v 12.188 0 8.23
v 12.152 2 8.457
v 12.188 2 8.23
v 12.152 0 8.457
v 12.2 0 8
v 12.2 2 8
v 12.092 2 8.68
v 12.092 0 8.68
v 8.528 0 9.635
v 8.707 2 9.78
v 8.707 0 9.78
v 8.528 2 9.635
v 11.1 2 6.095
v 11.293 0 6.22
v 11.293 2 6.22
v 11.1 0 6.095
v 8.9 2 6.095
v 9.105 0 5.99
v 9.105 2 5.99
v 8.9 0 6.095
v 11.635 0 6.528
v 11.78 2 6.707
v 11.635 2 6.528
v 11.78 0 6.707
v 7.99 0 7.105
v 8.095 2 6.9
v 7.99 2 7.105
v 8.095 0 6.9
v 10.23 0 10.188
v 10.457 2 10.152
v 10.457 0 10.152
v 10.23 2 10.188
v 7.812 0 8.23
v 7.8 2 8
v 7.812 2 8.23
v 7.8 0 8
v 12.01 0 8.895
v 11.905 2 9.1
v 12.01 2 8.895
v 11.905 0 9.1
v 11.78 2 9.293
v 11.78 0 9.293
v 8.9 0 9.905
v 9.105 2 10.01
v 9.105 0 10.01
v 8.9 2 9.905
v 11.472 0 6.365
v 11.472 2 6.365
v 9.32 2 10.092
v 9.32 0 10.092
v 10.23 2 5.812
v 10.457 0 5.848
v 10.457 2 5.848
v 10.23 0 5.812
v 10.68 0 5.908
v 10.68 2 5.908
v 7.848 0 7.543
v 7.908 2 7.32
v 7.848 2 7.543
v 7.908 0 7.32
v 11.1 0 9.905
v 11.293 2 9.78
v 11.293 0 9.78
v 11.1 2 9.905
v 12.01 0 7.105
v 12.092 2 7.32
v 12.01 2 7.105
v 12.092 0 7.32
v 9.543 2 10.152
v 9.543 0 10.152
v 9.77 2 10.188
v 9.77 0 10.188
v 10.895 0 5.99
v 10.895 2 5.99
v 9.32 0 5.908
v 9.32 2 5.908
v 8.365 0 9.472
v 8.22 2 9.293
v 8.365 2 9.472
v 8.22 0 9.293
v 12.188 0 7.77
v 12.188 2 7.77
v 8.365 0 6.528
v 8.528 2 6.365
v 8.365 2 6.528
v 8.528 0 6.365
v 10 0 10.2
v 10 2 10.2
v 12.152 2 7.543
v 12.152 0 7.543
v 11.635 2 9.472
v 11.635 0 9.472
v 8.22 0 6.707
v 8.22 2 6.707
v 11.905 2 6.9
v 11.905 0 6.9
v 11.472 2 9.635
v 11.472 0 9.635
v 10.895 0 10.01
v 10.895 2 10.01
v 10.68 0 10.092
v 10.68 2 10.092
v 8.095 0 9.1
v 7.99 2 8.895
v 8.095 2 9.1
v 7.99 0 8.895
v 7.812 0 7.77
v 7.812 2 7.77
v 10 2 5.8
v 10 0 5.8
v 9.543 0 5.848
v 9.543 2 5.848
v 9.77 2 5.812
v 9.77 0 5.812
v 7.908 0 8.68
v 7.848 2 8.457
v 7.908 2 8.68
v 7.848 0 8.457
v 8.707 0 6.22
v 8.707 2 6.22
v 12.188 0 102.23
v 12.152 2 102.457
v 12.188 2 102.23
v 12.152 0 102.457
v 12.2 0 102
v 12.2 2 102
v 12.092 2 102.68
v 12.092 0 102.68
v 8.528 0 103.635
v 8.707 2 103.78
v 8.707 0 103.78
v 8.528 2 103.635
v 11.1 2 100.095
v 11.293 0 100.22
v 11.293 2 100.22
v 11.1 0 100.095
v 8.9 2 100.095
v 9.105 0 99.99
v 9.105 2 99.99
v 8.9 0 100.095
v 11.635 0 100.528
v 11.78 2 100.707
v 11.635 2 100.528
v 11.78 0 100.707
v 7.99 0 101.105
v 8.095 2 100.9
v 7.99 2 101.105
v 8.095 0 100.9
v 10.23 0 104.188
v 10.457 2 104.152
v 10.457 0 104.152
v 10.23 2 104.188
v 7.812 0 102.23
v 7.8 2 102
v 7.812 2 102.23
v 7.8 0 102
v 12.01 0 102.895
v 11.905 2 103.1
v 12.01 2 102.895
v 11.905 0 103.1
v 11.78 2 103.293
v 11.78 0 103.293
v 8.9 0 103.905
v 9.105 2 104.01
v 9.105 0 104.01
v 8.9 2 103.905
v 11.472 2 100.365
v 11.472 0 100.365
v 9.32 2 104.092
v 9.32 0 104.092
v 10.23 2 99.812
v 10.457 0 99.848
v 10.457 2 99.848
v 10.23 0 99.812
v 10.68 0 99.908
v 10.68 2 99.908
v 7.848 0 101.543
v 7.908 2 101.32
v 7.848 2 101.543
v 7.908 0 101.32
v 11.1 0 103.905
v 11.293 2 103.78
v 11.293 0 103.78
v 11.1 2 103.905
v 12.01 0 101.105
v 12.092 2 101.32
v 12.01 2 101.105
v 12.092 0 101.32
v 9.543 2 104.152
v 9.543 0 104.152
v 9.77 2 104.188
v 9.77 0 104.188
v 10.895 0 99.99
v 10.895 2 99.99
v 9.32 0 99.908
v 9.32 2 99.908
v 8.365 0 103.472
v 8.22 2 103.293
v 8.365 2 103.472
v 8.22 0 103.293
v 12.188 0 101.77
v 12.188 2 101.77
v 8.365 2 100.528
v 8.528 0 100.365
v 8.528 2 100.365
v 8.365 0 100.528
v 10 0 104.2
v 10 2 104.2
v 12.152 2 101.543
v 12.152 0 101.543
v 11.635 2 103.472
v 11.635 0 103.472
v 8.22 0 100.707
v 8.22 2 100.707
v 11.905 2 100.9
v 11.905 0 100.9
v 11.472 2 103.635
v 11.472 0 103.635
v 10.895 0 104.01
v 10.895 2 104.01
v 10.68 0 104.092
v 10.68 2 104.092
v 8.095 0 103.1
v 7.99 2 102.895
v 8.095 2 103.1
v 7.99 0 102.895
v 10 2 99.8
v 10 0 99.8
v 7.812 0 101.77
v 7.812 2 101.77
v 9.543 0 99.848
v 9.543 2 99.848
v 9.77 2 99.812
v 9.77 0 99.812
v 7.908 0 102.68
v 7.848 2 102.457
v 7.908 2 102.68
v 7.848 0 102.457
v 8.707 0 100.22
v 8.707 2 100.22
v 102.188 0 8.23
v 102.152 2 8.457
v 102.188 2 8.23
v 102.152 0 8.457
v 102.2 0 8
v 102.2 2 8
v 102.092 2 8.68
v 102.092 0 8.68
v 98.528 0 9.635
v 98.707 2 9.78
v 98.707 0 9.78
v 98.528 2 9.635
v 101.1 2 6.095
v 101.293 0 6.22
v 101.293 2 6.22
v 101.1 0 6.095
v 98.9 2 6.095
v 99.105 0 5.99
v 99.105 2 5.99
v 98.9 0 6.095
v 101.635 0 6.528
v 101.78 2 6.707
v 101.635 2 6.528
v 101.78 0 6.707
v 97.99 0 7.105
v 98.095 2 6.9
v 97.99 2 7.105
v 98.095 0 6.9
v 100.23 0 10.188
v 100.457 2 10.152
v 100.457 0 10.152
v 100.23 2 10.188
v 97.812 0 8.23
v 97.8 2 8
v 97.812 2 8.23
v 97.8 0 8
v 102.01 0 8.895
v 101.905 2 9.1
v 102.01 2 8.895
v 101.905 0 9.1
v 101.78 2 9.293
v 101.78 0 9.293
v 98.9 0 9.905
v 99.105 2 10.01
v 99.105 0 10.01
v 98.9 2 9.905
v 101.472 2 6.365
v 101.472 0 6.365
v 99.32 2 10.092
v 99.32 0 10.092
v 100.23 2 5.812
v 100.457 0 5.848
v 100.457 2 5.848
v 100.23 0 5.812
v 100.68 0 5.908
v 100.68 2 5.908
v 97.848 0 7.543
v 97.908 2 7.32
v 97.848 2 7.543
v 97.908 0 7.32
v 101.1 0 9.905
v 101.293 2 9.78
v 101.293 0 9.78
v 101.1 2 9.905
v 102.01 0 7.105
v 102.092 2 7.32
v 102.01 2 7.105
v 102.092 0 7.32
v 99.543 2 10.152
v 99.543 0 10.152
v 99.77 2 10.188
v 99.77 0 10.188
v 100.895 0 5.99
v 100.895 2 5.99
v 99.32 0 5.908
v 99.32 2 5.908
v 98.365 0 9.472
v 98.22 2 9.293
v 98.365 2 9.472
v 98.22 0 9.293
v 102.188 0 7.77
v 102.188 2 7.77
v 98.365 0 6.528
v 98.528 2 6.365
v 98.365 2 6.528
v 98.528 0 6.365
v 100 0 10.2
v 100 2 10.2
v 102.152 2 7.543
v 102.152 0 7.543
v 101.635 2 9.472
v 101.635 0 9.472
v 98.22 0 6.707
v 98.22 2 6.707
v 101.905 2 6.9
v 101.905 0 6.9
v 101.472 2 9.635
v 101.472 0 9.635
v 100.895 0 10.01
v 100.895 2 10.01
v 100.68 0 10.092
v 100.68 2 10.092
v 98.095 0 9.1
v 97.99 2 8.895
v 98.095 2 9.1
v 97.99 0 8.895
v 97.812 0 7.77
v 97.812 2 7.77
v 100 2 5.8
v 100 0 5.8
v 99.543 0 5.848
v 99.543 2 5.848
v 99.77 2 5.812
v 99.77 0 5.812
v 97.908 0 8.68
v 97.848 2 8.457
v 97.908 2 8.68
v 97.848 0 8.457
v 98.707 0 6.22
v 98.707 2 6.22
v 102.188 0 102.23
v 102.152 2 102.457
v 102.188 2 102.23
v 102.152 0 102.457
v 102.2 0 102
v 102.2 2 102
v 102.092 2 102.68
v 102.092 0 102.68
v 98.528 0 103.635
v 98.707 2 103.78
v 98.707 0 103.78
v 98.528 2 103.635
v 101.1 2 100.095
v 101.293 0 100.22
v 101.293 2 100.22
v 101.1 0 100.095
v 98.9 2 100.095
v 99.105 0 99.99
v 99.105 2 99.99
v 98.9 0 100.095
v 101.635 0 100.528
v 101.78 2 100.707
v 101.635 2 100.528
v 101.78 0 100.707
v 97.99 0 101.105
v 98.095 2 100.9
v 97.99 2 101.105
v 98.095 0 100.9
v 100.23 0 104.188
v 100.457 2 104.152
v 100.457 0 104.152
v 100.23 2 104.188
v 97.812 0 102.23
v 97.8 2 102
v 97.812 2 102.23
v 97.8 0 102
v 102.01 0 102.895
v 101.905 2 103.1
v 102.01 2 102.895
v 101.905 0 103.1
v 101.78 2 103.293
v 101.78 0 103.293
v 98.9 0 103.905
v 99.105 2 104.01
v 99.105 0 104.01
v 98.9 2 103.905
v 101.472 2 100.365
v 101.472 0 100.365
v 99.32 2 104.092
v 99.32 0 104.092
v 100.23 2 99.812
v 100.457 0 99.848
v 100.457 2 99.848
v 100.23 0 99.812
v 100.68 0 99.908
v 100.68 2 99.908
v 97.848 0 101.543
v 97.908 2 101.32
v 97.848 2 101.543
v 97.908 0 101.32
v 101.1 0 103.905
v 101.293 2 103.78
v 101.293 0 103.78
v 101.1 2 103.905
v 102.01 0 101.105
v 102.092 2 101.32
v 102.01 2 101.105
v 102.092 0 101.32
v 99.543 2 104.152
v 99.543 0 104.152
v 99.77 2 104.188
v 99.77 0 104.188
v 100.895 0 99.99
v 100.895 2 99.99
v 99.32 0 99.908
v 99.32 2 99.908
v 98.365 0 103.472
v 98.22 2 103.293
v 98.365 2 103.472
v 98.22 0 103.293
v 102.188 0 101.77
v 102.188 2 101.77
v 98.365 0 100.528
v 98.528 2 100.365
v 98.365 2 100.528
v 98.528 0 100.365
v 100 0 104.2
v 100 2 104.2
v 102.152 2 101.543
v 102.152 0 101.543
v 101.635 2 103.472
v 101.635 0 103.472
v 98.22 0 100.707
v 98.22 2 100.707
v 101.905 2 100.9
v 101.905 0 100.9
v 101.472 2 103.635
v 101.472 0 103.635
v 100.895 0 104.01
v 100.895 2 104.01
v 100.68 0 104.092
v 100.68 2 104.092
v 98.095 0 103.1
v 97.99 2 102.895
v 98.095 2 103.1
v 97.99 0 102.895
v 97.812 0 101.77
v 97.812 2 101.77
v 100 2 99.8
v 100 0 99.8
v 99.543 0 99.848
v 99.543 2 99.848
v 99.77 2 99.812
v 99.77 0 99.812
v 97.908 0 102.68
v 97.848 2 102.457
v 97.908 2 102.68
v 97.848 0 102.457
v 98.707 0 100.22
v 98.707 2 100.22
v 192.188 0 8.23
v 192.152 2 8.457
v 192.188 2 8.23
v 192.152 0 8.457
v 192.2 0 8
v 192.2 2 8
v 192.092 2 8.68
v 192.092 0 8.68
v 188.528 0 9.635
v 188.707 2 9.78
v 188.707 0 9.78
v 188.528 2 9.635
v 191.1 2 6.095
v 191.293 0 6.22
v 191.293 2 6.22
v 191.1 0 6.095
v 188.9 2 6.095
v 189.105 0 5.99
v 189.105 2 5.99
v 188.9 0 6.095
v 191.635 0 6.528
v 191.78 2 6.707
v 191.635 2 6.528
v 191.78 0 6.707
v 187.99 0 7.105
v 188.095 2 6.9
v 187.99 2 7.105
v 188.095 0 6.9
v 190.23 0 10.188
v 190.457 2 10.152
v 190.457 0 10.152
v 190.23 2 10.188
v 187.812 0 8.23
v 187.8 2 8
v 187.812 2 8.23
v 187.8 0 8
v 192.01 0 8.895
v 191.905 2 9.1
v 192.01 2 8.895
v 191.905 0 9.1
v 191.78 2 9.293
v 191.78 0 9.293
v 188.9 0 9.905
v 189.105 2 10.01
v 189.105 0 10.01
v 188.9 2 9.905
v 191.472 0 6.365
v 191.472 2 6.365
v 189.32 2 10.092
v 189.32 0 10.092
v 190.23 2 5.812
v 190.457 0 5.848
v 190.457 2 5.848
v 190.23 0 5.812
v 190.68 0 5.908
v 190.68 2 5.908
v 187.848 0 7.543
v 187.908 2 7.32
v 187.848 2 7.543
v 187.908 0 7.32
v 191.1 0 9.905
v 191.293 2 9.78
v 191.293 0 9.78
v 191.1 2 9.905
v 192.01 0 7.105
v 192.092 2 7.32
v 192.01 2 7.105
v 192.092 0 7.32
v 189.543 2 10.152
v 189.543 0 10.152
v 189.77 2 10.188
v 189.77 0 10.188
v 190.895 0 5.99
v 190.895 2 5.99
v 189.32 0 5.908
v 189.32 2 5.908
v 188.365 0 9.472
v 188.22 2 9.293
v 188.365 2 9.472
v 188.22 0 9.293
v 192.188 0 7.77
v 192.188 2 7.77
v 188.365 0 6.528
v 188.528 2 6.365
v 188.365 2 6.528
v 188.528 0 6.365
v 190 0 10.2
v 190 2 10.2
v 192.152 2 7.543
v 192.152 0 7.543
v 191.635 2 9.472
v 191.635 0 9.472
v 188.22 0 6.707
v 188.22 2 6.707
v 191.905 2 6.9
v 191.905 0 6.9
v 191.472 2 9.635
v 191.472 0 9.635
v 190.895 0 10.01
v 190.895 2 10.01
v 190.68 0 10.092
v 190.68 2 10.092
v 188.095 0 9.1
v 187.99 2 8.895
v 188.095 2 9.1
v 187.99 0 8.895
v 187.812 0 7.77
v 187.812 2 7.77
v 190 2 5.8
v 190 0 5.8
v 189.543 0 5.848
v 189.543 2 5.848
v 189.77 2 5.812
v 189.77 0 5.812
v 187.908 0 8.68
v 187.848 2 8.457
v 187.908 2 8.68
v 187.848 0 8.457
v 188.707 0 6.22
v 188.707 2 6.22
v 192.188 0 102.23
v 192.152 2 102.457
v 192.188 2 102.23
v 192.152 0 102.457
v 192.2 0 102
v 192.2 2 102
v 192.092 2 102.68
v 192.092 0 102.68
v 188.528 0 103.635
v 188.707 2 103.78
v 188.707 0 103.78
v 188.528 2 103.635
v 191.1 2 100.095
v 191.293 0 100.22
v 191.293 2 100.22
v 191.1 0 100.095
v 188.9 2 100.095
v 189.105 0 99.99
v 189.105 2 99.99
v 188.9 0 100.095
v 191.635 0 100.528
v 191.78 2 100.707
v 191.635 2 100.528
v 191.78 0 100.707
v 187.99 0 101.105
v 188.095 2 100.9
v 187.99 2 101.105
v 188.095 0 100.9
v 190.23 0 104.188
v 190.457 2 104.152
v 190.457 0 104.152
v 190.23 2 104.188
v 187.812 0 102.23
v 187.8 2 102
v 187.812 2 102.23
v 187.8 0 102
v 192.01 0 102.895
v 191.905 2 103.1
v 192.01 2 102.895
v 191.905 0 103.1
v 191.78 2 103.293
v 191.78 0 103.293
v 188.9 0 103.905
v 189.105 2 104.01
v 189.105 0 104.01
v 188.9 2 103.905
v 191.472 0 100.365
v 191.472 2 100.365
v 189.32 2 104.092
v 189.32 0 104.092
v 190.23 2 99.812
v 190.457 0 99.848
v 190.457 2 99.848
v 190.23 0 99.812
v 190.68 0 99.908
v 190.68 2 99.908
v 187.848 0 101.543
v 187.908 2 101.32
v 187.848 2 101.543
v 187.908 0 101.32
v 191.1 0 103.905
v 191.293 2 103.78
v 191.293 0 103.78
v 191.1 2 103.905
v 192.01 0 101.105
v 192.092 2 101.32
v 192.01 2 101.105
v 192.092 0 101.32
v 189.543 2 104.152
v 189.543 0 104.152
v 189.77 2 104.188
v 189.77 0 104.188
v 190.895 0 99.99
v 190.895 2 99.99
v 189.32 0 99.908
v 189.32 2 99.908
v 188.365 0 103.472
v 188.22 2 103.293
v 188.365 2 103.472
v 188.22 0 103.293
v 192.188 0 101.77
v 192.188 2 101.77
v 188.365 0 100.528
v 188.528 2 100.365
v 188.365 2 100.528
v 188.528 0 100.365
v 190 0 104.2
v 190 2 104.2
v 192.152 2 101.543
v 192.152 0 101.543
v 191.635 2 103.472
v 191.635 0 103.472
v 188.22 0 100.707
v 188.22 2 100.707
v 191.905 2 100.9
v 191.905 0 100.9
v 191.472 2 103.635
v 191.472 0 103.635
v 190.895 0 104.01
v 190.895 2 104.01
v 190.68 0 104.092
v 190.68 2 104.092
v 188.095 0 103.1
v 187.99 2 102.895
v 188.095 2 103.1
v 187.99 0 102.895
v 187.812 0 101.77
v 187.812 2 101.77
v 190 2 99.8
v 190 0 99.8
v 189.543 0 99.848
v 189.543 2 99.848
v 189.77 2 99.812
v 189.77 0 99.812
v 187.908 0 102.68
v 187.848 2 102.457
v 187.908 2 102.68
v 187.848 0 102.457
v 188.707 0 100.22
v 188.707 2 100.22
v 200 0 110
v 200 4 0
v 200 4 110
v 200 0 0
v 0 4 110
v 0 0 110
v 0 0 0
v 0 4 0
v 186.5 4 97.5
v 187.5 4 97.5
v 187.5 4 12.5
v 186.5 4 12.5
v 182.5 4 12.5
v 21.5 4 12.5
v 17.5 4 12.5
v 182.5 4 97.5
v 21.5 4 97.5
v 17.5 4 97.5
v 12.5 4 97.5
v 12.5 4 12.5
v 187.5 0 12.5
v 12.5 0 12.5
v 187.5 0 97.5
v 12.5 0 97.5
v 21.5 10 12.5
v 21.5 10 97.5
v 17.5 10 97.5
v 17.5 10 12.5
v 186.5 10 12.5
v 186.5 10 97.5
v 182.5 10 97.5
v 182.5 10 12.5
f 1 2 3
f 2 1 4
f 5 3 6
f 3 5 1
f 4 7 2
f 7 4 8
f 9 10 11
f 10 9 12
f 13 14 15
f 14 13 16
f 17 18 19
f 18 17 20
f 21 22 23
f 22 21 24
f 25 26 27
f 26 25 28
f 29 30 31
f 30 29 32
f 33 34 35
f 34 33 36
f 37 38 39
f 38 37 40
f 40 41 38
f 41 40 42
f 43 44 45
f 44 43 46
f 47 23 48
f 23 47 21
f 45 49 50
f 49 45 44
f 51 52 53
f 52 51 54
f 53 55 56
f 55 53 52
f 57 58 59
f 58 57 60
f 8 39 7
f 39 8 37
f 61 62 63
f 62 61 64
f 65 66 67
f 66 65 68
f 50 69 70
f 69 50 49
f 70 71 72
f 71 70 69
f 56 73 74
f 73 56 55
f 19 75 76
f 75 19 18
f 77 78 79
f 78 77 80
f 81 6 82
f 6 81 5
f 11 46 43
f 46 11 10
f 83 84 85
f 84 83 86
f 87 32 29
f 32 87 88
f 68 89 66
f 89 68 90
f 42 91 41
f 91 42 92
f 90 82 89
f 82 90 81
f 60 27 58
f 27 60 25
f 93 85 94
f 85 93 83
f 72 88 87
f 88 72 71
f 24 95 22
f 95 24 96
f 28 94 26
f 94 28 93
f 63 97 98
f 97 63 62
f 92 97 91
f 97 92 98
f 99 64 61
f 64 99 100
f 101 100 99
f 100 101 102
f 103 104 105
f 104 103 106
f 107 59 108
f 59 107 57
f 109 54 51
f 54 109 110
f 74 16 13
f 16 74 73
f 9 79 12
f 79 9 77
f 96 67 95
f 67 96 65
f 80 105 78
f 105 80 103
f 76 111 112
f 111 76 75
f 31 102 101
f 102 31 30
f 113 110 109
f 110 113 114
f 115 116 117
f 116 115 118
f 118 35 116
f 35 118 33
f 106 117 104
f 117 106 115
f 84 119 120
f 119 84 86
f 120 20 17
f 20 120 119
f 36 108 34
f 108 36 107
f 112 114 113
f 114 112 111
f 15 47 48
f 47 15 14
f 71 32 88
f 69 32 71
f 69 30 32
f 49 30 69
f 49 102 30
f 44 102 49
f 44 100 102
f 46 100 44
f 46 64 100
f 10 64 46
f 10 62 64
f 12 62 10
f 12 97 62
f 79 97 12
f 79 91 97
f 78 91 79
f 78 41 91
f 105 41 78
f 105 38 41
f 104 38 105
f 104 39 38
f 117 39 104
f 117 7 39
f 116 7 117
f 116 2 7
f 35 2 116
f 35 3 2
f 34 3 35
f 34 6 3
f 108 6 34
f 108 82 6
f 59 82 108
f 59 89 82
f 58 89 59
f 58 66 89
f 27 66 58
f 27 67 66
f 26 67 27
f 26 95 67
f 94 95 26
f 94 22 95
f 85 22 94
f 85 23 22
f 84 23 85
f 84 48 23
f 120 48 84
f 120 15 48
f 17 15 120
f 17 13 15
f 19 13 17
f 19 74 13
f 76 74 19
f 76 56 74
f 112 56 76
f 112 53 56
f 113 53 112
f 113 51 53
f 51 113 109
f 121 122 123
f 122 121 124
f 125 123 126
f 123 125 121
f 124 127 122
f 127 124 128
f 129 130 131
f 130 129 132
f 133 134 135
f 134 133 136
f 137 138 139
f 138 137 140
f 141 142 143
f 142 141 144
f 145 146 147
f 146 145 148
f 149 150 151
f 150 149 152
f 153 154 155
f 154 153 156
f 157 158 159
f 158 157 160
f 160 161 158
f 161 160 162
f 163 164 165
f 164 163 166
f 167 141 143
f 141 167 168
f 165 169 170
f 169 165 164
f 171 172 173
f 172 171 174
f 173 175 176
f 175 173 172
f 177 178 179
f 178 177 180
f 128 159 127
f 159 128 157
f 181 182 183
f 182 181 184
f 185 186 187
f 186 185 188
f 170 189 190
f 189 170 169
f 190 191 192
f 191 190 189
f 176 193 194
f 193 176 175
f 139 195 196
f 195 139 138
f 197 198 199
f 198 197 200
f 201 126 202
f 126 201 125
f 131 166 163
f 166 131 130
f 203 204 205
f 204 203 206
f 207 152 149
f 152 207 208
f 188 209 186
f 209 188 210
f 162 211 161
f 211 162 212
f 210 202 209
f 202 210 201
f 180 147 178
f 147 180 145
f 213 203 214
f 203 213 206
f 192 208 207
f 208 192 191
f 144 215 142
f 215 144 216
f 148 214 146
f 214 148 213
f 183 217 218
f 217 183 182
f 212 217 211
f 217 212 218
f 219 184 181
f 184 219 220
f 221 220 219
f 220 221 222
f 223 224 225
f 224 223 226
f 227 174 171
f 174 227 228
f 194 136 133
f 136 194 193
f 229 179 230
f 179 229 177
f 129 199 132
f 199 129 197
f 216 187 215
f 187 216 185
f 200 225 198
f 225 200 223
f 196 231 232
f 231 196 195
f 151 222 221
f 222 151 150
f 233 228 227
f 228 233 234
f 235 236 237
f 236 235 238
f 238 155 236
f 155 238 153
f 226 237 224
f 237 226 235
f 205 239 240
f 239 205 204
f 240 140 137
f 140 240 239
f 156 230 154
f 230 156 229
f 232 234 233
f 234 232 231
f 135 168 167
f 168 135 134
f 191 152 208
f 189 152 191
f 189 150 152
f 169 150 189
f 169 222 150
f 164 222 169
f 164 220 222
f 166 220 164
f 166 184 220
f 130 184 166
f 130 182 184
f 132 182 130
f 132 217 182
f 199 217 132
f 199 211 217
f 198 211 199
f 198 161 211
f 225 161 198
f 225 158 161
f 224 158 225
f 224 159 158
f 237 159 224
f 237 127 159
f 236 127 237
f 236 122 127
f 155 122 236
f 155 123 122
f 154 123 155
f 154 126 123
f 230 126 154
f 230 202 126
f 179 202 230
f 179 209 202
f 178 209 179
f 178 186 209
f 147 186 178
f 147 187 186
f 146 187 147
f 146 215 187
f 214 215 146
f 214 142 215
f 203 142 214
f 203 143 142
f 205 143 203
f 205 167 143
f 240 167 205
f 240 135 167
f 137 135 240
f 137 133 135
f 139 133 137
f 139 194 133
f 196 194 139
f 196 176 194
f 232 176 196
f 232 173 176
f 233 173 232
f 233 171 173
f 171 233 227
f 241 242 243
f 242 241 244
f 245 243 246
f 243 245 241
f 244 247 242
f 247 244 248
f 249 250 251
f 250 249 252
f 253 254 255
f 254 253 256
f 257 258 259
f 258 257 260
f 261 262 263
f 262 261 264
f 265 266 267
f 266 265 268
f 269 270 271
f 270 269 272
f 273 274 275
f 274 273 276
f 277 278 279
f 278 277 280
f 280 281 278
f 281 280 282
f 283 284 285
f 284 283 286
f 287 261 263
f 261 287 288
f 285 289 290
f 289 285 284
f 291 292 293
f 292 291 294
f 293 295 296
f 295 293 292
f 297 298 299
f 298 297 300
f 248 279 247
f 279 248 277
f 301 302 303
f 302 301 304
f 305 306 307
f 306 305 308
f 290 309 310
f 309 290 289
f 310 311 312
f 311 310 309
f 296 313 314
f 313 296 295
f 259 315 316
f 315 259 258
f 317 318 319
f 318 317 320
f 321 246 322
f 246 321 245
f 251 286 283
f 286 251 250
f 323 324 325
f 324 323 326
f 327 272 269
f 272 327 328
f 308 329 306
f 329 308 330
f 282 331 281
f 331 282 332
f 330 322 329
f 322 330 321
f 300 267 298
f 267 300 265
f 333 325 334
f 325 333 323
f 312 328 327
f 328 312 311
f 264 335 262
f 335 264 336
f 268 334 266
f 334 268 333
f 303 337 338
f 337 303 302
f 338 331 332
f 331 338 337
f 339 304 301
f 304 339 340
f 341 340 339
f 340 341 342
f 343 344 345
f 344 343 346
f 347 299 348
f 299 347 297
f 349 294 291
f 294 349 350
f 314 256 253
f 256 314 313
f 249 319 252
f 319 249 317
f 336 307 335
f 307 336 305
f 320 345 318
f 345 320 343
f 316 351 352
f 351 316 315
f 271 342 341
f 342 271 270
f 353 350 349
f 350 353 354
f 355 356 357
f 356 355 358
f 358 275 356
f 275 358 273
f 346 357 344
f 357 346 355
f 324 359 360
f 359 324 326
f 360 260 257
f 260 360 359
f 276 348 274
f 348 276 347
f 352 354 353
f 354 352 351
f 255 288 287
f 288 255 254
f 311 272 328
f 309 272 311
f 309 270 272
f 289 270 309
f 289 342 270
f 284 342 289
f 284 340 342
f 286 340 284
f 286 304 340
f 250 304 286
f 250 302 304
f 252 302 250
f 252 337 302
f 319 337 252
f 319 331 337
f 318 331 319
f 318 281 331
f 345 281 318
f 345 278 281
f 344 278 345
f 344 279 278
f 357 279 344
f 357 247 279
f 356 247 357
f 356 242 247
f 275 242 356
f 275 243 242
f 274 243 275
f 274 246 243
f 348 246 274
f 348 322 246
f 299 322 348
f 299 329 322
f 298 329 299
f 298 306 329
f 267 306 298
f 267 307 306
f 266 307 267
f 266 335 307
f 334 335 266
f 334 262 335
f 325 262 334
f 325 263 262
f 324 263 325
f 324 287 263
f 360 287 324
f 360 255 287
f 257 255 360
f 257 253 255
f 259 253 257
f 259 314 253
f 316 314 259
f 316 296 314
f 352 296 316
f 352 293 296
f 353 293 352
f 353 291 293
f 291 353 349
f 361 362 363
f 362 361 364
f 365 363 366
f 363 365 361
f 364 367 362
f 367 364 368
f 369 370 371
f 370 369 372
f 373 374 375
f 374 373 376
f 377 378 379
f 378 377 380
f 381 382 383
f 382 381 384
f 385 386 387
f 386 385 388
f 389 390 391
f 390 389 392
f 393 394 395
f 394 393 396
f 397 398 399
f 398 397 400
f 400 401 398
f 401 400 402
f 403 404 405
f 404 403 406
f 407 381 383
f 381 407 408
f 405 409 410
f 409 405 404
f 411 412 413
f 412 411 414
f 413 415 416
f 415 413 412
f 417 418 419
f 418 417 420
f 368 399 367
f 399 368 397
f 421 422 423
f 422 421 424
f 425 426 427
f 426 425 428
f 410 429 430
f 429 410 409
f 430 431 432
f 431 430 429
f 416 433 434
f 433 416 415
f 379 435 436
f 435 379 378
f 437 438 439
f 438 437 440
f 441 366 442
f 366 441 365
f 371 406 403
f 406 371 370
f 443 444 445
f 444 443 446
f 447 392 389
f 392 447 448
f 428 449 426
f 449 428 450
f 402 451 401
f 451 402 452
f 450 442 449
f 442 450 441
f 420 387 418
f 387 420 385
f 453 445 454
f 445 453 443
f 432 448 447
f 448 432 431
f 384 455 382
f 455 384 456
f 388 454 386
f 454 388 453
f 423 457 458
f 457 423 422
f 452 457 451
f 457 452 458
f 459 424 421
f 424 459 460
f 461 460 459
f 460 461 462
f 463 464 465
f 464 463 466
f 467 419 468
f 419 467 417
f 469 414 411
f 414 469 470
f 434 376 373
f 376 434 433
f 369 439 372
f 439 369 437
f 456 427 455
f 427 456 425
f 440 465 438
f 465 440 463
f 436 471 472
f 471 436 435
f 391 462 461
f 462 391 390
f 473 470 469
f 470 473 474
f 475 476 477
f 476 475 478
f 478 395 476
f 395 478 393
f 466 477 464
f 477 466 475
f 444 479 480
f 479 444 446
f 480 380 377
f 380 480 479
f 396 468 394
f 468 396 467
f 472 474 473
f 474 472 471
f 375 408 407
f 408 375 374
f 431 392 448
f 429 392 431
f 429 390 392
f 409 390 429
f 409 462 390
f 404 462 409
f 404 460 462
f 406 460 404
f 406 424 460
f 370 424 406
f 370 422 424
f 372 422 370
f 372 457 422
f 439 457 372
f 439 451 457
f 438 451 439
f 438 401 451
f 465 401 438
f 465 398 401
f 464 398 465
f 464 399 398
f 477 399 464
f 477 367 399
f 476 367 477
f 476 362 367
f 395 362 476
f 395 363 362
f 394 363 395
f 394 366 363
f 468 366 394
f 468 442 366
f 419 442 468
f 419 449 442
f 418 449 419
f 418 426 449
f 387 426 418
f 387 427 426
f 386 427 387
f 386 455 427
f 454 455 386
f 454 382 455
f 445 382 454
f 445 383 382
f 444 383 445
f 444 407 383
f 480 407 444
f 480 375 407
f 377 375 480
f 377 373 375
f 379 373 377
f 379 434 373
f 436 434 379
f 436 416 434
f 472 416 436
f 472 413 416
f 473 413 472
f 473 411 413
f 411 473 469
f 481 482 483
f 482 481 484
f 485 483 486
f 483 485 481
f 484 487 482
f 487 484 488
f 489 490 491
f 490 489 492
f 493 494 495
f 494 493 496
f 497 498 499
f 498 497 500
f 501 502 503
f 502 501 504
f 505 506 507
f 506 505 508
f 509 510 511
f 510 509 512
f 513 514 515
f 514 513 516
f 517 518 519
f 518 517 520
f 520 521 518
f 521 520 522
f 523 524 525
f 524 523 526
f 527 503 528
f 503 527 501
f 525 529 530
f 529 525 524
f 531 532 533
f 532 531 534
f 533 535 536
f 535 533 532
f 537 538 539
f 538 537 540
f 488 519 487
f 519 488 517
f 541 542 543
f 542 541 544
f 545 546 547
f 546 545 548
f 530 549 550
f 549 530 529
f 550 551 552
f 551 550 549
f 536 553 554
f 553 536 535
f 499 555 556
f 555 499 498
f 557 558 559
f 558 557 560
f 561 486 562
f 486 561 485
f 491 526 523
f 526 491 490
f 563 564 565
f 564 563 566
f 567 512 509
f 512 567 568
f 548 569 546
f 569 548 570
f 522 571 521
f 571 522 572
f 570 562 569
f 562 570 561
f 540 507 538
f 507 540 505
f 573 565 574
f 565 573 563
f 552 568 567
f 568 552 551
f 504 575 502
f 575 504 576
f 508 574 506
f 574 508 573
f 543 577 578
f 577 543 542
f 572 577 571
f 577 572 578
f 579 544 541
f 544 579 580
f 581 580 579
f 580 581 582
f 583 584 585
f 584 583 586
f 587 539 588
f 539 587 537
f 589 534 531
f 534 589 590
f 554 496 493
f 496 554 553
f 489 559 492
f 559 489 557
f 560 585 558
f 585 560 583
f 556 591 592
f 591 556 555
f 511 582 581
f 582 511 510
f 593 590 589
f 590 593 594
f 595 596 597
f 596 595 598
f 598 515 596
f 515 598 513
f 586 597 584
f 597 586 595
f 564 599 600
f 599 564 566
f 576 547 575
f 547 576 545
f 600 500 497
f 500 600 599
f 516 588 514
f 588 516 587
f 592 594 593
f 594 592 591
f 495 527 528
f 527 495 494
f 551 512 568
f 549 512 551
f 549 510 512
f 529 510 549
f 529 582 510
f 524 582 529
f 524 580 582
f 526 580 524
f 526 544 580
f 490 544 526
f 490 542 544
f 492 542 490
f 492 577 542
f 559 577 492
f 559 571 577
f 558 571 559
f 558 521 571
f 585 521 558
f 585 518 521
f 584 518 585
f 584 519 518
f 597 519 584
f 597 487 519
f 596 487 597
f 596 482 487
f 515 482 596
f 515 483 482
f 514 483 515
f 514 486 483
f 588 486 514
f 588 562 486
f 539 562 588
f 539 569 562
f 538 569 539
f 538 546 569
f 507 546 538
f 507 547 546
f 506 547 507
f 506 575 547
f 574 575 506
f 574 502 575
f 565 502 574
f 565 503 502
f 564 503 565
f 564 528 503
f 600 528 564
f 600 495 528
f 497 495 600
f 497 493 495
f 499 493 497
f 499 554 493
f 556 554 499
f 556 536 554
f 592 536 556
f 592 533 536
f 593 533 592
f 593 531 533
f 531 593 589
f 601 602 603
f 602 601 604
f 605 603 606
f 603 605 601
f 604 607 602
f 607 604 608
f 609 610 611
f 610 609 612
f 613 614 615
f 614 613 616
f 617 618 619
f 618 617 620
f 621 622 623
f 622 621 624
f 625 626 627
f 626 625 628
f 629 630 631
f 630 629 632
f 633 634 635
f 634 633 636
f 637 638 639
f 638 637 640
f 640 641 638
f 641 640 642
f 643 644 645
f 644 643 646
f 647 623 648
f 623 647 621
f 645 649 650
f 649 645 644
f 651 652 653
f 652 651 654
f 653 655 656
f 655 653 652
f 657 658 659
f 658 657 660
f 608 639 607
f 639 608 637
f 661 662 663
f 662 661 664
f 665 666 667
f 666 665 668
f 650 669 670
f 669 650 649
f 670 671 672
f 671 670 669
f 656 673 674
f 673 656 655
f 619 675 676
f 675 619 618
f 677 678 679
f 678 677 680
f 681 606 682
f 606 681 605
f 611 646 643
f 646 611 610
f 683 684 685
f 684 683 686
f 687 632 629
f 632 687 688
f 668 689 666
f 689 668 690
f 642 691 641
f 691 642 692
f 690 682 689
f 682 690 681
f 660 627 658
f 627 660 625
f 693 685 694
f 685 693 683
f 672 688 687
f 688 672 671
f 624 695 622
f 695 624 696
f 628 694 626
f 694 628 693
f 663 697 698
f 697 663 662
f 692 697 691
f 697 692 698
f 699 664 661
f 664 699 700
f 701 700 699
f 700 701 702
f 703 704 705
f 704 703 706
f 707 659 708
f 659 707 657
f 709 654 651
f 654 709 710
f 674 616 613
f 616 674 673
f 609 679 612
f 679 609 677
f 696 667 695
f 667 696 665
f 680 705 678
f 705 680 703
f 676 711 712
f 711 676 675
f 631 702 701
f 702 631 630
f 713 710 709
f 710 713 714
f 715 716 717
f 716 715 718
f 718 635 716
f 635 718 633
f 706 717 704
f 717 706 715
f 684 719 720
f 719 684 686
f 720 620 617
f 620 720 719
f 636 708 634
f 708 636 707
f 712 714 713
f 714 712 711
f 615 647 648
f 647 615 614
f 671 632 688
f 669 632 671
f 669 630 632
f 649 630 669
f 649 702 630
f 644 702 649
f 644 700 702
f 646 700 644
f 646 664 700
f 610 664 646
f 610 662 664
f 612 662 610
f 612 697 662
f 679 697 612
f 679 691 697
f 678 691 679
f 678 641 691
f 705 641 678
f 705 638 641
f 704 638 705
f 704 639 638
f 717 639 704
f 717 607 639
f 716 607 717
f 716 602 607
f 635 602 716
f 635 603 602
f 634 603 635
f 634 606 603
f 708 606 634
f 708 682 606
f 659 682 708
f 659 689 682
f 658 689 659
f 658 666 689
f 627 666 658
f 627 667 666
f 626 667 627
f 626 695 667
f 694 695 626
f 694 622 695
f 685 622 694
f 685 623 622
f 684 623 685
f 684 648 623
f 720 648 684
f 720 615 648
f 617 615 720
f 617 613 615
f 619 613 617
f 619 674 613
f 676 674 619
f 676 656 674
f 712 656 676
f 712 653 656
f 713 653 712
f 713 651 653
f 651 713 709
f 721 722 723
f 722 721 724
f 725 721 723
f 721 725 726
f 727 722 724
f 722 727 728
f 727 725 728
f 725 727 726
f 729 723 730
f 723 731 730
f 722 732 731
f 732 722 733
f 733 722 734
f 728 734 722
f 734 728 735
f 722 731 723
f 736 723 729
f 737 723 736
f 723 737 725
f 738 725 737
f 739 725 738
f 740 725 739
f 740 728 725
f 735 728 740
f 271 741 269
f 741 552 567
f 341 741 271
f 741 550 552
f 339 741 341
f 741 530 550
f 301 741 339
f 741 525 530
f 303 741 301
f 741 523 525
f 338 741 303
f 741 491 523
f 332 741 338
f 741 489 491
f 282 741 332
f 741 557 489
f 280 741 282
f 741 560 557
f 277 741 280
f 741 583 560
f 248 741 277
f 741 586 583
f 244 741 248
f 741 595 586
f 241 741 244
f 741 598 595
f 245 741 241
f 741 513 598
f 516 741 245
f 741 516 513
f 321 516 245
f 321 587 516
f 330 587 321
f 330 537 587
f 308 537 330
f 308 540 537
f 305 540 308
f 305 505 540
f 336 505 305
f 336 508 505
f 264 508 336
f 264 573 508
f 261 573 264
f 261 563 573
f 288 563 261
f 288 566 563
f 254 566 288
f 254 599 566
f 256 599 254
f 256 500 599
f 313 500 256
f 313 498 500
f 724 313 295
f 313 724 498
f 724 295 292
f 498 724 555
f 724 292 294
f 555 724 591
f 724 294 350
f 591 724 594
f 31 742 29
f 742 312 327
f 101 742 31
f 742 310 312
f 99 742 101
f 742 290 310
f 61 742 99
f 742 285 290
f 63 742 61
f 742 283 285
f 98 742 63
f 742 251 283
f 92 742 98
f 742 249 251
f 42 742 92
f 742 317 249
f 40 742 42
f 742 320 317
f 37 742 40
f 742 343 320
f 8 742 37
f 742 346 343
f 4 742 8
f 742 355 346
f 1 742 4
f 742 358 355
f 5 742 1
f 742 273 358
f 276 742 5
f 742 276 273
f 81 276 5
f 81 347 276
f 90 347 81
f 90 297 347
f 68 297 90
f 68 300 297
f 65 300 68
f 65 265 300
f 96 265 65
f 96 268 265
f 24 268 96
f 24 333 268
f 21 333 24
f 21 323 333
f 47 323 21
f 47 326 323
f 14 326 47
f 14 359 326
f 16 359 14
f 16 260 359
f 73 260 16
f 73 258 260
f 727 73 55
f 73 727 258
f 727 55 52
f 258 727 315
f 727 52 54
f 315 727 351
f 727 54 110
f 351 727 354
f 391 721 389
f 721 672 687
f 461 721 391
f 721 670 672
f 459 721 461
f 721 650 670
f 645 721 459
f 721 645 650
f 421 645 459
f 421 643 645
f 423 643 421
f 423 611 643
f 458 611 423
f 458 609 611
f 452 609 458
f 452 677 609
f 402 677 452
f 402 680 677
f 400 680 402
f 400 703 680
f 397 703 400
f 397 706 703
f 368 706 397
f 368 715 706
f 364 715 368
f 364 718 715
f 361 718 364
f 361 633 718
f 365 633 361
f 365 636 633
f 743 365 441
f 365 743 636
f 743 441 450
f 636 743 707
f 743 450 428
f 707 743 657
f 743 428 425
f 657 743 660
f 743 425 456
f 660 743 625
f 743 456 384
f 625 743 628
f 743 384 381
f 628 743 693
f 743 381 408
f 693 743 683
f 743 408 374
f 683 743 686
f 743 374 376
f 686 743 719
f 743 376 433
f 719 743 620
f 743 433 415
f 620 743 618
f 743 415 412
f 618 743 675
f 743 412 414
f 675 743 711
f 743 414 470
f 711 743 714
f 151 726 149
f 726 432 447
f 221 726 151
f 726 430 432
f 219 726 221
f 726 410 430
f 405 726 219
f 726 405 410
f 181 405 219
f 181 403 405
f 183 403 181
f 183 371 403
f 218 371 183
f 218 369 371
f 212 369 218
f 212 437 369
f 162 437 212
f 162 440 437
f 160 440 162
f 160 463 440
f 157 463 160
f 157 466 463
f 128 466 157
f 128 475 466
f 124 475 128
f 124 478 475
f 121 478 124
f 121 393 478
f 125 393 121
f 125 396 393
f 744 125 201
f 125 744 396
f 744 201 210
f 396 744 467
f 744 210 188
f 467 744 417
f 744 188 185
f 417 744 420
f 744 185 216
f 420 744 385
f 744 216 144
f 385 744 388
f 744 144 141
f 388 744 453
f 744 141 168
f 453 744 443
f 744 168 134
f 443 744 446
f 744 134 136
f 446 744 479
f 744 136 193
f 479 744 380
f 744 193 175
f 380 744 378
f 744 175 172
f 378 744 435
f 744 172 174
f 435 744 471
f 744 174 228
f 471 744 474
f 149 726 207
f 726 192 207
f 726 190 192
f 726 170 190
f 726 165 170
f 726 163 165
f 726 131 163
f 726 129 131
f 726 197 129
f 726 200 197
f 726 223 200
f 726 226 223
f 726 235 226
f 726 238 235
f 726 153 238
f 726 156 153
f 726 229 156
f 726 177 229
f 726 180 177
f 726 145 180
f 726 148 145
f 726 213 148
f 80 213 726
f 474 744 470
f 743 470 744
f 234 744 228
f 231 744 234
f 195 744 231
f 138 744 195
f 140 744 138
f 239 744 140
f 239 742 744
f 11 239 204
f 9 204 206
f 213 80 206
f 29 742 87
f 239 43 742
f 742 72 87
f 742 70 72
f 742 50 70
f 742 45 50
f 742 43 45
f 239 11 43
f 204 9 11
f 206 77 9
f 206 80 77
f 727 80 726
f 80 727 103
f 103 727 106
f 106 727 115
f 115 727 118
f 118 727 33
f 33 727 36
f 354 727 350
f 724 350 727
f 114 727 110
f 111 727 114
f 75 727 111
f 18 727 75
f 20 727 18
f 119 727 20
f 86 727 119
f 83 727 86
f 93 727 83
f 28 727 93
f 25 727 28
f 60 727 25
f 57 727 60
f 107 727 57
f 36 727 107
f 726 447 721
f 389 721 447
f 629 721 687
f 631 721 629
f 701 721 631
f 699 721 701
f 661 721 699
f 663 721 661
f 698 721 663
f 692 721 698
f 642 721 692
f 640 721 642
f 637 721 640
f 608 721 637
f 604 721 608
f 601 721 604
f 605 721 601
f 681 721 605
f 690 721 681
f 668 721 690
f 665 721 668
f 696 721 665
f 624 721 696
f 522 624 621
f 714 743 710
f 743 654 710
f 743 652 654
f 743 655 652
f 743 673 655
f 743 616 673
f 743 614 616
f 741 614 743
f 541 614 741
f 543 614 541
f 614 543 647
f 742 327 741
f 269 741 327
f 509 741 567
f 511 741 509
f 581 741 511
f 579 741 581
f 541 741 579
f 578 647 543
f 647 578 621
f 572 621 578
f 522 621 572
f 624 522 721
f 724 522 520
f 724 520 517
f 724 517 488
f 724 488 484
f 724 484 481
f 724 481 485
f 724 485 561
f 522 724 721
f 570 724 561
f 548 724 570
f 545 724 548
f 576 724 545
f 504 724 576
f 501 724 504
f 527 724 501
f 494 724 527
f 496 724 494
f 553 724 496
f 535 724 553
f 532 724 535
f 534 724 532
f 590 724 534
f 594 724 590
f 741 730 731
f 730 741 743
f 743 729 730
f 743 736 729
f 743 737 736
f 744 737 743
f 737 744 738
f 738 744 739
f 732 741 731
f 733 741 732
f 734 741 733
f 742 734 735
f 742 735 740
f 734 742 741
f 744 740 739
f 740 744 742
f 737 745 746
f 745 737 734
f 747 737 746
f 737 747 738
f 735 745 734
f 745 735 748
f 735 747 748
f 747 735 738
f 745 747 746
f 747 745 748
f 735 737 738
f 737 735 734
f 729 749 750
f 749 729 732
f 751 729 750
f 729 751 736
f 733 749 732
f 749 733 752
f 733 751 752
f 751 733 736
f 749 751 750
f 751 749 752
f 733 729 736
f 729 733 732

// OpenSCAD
/*
 * mounting_brackets_bms.scad
 * TM-BMS-001 Rev A — BMS Mounting Hardware
 *
 * Hardware for mounting and organizing BMS equipment in field deployments:
 *   - BMS controller panel mount (rack / pelican lid)
 *   - Cell holder mounting tray (vehicle / pack box)
 *   - Mast clamp for battery box (50–60mm round mast)
 *   - DIN rail clip for BMS board
 *   - Kelvin shunt mounting block
 *   - Balance resistor ventilated bracket
 *   - Sensor bracket (NTC thermistor, cell surface mount)
 *   - Cable strain relief / terminal label clips
 *   - Pack lid with voltage window (for voltmeter display)
 *
 * Print: PETG or ASA. 3 perimeters, 30% infill, 0.3mm layer.
 * Units: mm
 */

$fn = 60;

// ─── Constants ───────────────────────────────────────────────────────────────
WALL  = 3.0;
M3_C  = 3.4;
M3_I  = 4.5;
M4_C  = 4.4;
M5_C  = 5.4;
M6_C  = 6.4;
M8_C  = 8.5;

// =============================================================================
// MODULE 1: PANEL MOUNT FACEPLATE
// =============================================================================
// Mounts BMS controller enclosure into a Pelican case lid or equipment panel.
// Faceplate is flush; enclosure sits behind the panel.
// =============================================================================
module panel_faceplate(
    PW  = 175,   // Panel cutout width
    PH  = 85,    // Panel cutout height
    FW  = 200,   // Faceplate total width (with flanges)
    FH  = 110,   // Faceplate total height
    FT  = 4.0    // Faceplate thickness
) {
    difference() {
        cube([FW, FT, FH]);

        // Central cutout for display/front panel access
        translate([(FW-PW)/2, -1, (FH-PH)/2]) cube([PW, FT+2, PH]);

        // Mounting flange holes (6× M4, two rows)
        for (x=[10, FW/2, FW-10]) for (z=[8, FH-8]) {
            translate([x, FT/2, z]) rotate([90,0,0]) cylinder(d=M4_C, h=FT+2);
        }

        // Countersink on front face
        for (x=[10, FW/2, FW-10]) for (z=[8, FH-8]) {
            translate([x, -1, z]) rotate([90,0,0]) cylinder(d=8.5, h=3);
        }
    }

    // Alignment tabs (rear face, engage enclosure rim)
    for (side=[-1, 1]) {
        translate([(FW + side*(PW-10))/2, FT, (FH-PH)/2])
            cube([4, 6, PH]);
    }
}

// =============================================================================
// MODULE 2: CELL HOLDER MOUNTING TRAY
// =============================================================================
// Flat tray with retaining lips and anti-skid bosses.
// Accepts 3S2P cell holder; bolts to vehicle console or pack box base.
// =============================================================================
module cell_tray(
    CW = 90,    // Cell holder footprint width
    CD = 80,    // Cell holder footprint depth
    TH = 5.0    // Tray height
) {
    TW = CW + 2*WALL + 6;
    TD = CD + 2*WALL + 6;

    difference() {
        cube([TW, TD, TH]);

        // Cell holder pocket (inset, cell holder drops in)
        translate([WALL+3, WALL+3, TH-2]) cube([CW, CD, TH]);

        // M3 through-holes for securing cell holder
        for (x=[WALL+8, TW-WALL-8]) for (y=[WALL+8, TD-WALL-8]) {
            translate([x, y, -1]) cylinder(d=M3_C, h=TH+2);
        }

        // Tray mounting slots (elongated, for vehicle track or rail)
        for (x=[WALL/2, TW-WALL/2]) {
            translate([x-2, TD/2-12, -1]) cube([4, 24, TH+2]);
        }
    }

    // Retaining lip (prevents cell holder from sliding up)
    for (side=[0, 1]) {
        translate([side*(TW-WALL-3), WALL+3, TH-2])
            cube([WALL+3, CD, 4]);
    }
}

// =============================================================================
// MODULE 3: MAST CLAMP FOR BATTERY BOX
// =============================================================================
// Clamps BMS/battery box assembly to a vertical mast (40–60mm dia)
// Saddle clamp style; two U-bolts or M8 clamping bolts
// =============================================================================
module mast_clamp_bms(
    mast_d  = 50,
    plate_l = 90,    // Length of mounting plate
    plate_w = 80,    // Width of mounting plate
    plate_t = 5.0    // Plate thickness
) {
    CLAMP_H = 50;
    CLAMP_T = WALL + 4;

    difference() {
        union() {
            // Curved saddle to fit mast
            difference() {
                cylinder(d=mast_d + 2*CLAMP_T, h=CLAMP_H);
                cylinder(d=mast_d + 1.0, h=CLAMP_H + 2);  // Mast bore
            }

            // Flat mounting plate on back
            translate([-(plate_l/2), -(mast_d/2 + CLAMP_T), 0])
                cube([plate_l, plate_w, plate_t]);
        }

        // Remove front half of clamp (strap/U-bolt holds it)
        translate([-(mast_d + CLAMP_T*2 + 5), 0, -1])
            cube([mast_d + CLAMP_T*2 + 5, mast_d + CLAMP_T*2 + 5, CLAMP_H + 2]);

        // U-bolt clearance slots
        for (z=[12, CLAMP_H-12]) {
            translate([-(mast_d/2 + CLAMP_T + 2), -(mast_d/2 + CLAMP_T + 2), z-3])
                cube([mast_d + 2*CLAMP_T + 4, 6, 6]);
        }

        // Battery box mounting holes on plate
        for (x=[-plate_l/2+15, plate_l/2-15]) for (y=[10, plate_w-10]) {
            translate([x, -(mast_d/2 + CLAMP_T) + y, -1])
                cylinder(d=M4_C, h=plate_t+2);
        }
    }
}

// =============================================================================
// MODULE 4: DIN RAIL CLIP — 35mm TS35
// =============================================================================
// Snaps onto 35mm DIN rail. Mounts BMS PCB or small module.
// =============================================================================
module din_clip_bms(body_w=50, body_h=40, body_d=18) {
    DIN_HOOK = 2.5;
    DIN_H    = 7.5;

    difference() {
        union() {
            cube([body_w, body_d, body_h]);
            // Fixed hook (top)
            translate([0, 0, body_h - DIN_HOOK - DIN_H])
                cube([body_w, DIN_H + DIN_HOOK, DIN_HOOK]);
            translate([0, DIN_H, body_h - DIN_HOOK - DIN_H])
                cube([body_w, DIN_HOOK, DIN_H + DIN_HOOK]);
        }
        // Device mounting holes
        for (x=[body_w/4, 3*body_w/4]) {
            translate([x, body_d/2, -1]) cylinder(d=M3_C, h=body_h+2);
        }
        // Spring slot (bottom snap)
        translate([5, -1, 5]) cube([body_w-10, DIN_H+2, DIN_HOOK+1]);
    }

    // Bottom snap tongue
    translate([6, 0, 0]) difference() {
        cube([body_w-12, DIN_H, DIN_HOOK+2]);
        translate([2, -1, -1]) cube([body_w-16, DIN_H+2, DIN_HOOK+4]);
    }
}

// =============================================================================
// MODULE 5: KELVIN SHUNT MOUNTING BLOCK
// =============================================================================
// PCB-mountable block that holds a 4-terminal current shunt resistor
// in correct orientation, strain-relieved.
// =============================================================================
module shunt_mount_block(
    SR_L = 25,   // Shunt resistor length (typical 25mm for 2W/5W type)
    SR_W = 8,    // Shunt body width
    SR_H = 4     // Shunt body height
) {
    BW = SR_L + 2*WALL;
    BD = SR_W + 2*WALL;
    BH = SR_H + WALL + 4;

    difference() {
        cube([BW, BD, BH]);
        // Resistor channel
        translate([WALL, WALL, WALL]) cube([SR_L, SR_W, SR_H + 2]);
        // Current terminal access holes (both ends)
        translate([-1, BD/2 - 3, WALL + SR_H/2 - 2]) cube([WALL+2, 6, 4]);
        translate([BW-WALL-1, BD/2 - 3, WALL + SR_H/2 - 2]) cube([WALL+2, 6, 4]);
        // Sense wire exit (bottom)
        for (x=[WALL + SR_L*0.2, WALL + SR_L*0.8]) {
            translate([x-1.5, BD/2, -1]) cube([3, 3, WALL+2]);
        }
        // PCB mounting holes
        for (x=[3, BW-3]) translate([x, BD/2, -1]) cylinder(d=M3_C, h=BH+2);
    }

    // Clamp bar (screws over top of resistor, holds it in channel)
    translate([BW + 5, 0, 0]) {
        difference() {
            cube([BW, BD, 4]);
            for (x=[3, BW-3]) translate([x, BD/2, -1]) cylinder(d=M3_C, h=6);
        }
    }
}

// =============================================================================
// MODULE 6: NTC THERMISTOR CELL SURFACE CLIP
// =============================================================================
// Spring clip holds NTC flat against prismatic cell surface.
// Retains sensor without adhesive for easy replacement.
// =============================================================================
module ntc_cell_clip(cell_w=105, clip_h=12) {
    CT = 1.5;   // Clip thickness

    // U-shaped clip body
    difference() {
        cube([20, cell_w, clip_h]);
        // NTC pocket (6mm × 6mm × 3mm deep recess, centered)
        translate([0, cell_w/2 - 3, clip_h/2 - 1.5]) cube([4, 6, 3]);
        // Lightening
        translate([CT, CT, CT]) cube([20-2*CT, cell_w-2*CT, clip_h-2*CT]);
    }

    // Spring fingers (press against cell)
    for (side=[0, 1]) {
        translate([0, side*(cell_w-CT), 0]) {
            difference() {
                cube([15, CT, clip_h]);
                translate([2, -1, 2]) cube([11, CT+2, clip_h-4]);
            }
        }
    }

    // Wire strain relief notch
    translate([20, cell_w/2-3, 0]) cube([5, 6, CT]);
}

// =============================================================================
// MODULE 7: BALANCE RESISTOR BRACKET — VENTILATED
// =============================================================================
// Open-frame bracket holding 4× 2W axial balance resistors.
// Designed for forced or convection cooling.
// =============================================================================
module balance_bracket(n=4, r_length=25, r_dia=6) {
    PITCH = r_length + 4;
    BW = n * PITCH + 2*WALL;
    BD = r_dia + 2*WALL + 4;
    BH = r_dia + 2*WALL;

    difference() {
        cube([BW, BD, BH]);
        // Resistor bores
        for (i=[0:n-1]) {
            translate([WALL + PITCH/2 + i*PITCH, -1, BH/2])
                rotate([-90,0,0]) cylinder(d=r_dia+0.5, h=BD+2);
        }
        // Airflow slots (sides)
        for (z=[BH*0.3, BH*0.6]) {
            translate([-1, BD/4, z]) cube([BW+2, BD/2, 3]);
        }
        // Terminal wire exits (front and back)
        for (i=[0:n-1]) {
            translate([WALL + PITCH/2 + i*PITCH - 2, -1, 0])
                cube([4, WALL+2, BH/3]);
            translate([WALL + PITCH/2 + i*PITCH - 2, BD-WALL-1, 0])
                cube([4, WALL+2, BH/3]);
        }
        // Mounting holes
        for (x=[5, BW-5]) translate([x, BD/2, -1]) cylinder(d=M3_C, h=BH+2);
    }
}

// =============================================================================
// MODULE 8: BATTERY TERMINAL COVER (insulating)
// =============================================================================
// Snap-on insulating cap for exposed M6 bus bar bolt heads.
// Prevents accidental short circuit from dropped tools.
// =============================================================================
module terminal_cover(bolt_head_d=12, bolt_head_h=6, cap_wall=2.5) {
    CID = bolt_head_d + 0.5;  // Inner diameter (clearance over bolt head)
    COD = CID + 2*cap_wall;
    CH  = bolt_head_h + cap_wall;

    difference() {
        cylinder(d=COD, h=CH);
        translate([0, 0, cap_wall]) cylinder(d=CID, h=CH);
    }

    // Snap ring (inner lip catches below bolt head)
    translate([0, 0, cap_wall + bolt_head_h - 1]) {
        difference() {
            cylinder(d=CID + 2, h=1.5);
            cylinder(d=CID - 2, h=2);
        }
    }

    // Tactile grip ridges (outer)
    for (i=[0:5]) rotate([0, 0, i*60]) {
        translate([COD/2, 0, CH/2]) cube([cap_wall*0.6, 2, CH*0.6], center=true);
    }
}

// =============================================================================
// MODULE 9: PACK LABEL PLATE
// =============================================================================
// Embossed information plate: chemistry, voltage, capacity, warnings.
// Bolts to battery enclosure lid.
// =============================================================================
module pack_label_plate(PW=90, PH=50, PT=2.5) {
    difference() {
        cube([PW, PT, PH]);
        // Mounting holes
        for (x=[5, PW-5]) for (z=[5, PH-5]) {
            translate([x, 0, z]) rotate([-90,0,0]) cylinder(d=M3_C, h=PT+1);
        }
        // Text field recess (emboss from this face)
        translate([8, PT-0.5, 12]) cube([PW-16, 0.6, PH-24]);
    }

    // Embossed warning text (printed as raised letters)
    // "LITHIUM BATTERY" line
    translate([PW/2 - 20, PT, PH-10]) {
        cube([40, 1, 2]);  // Underline bar (placeholder; use inkscape for text)
    }

    // Border ridge
    translate([3, PT, 3]) difference() {
        cube([PW-6, 1, PH-6]);
        translate([2, -1, 2]) cube([PW-10, 3, PH-10]);
    }
}

// =============================================================================
// MODULE 10: PACK CARRY HANDLE
// =============================================================================
// Sturdy top handle for portable battery pack.
// Bolts through lid with M4 × 20mm bolts and fender washers inside.
// =============================================================================
module carry_handle(
    span = 120,   // Distance between mounting posts
    h    = 35,    // Handle loop height above mounting surface
    grip_d = 18   // Grip tube diameter
) {
    GT = grip_d/2;  // Grip tube radius

    // Two mounting posts
    for (x=[0, span]) {
        translate([x, 0, 0]) {
            difference() {
                cylinder(d=grip_d + 4, h=h*0.6);
                translate([0, 0, -1]) cylinder(d=M4_C, h=h*0.6+2);
            }
        }
    }

    // Arch connecting the posts (half-torus)
    translate([span/2, 0, h*0.6]) rotate([90, 0, 0]) {
        rotate_extrude(angle=180) {
            translate([span/2, 0, 0]) circle(d=grip_d);
        }
    }
}

// =============================================================================
// RENDER CONTROLS
// =============================================================================

panel_faceplate();
// translate([0, 120, 0]) cell_tray();
// translate([0, 220, 0]) mast_clamp_bms(mast_d=50);
// translate([0, 340, 0]) din_clip_bms();
// translate([200, 0, 0]) shunt_mount_block();
// translate([200, 80, 0]) ntc_cell_clip();
// translate([200, 120, 0]) balance_bracket();
// translate([200, 200, 0]) { for (i=[0:3]) translate([i*20, 0, 0]) terminal_cover(); }
// translate([200, 300, 0]) pack_label_plate();
// translate([200, 380, 0]) carry_handle();
